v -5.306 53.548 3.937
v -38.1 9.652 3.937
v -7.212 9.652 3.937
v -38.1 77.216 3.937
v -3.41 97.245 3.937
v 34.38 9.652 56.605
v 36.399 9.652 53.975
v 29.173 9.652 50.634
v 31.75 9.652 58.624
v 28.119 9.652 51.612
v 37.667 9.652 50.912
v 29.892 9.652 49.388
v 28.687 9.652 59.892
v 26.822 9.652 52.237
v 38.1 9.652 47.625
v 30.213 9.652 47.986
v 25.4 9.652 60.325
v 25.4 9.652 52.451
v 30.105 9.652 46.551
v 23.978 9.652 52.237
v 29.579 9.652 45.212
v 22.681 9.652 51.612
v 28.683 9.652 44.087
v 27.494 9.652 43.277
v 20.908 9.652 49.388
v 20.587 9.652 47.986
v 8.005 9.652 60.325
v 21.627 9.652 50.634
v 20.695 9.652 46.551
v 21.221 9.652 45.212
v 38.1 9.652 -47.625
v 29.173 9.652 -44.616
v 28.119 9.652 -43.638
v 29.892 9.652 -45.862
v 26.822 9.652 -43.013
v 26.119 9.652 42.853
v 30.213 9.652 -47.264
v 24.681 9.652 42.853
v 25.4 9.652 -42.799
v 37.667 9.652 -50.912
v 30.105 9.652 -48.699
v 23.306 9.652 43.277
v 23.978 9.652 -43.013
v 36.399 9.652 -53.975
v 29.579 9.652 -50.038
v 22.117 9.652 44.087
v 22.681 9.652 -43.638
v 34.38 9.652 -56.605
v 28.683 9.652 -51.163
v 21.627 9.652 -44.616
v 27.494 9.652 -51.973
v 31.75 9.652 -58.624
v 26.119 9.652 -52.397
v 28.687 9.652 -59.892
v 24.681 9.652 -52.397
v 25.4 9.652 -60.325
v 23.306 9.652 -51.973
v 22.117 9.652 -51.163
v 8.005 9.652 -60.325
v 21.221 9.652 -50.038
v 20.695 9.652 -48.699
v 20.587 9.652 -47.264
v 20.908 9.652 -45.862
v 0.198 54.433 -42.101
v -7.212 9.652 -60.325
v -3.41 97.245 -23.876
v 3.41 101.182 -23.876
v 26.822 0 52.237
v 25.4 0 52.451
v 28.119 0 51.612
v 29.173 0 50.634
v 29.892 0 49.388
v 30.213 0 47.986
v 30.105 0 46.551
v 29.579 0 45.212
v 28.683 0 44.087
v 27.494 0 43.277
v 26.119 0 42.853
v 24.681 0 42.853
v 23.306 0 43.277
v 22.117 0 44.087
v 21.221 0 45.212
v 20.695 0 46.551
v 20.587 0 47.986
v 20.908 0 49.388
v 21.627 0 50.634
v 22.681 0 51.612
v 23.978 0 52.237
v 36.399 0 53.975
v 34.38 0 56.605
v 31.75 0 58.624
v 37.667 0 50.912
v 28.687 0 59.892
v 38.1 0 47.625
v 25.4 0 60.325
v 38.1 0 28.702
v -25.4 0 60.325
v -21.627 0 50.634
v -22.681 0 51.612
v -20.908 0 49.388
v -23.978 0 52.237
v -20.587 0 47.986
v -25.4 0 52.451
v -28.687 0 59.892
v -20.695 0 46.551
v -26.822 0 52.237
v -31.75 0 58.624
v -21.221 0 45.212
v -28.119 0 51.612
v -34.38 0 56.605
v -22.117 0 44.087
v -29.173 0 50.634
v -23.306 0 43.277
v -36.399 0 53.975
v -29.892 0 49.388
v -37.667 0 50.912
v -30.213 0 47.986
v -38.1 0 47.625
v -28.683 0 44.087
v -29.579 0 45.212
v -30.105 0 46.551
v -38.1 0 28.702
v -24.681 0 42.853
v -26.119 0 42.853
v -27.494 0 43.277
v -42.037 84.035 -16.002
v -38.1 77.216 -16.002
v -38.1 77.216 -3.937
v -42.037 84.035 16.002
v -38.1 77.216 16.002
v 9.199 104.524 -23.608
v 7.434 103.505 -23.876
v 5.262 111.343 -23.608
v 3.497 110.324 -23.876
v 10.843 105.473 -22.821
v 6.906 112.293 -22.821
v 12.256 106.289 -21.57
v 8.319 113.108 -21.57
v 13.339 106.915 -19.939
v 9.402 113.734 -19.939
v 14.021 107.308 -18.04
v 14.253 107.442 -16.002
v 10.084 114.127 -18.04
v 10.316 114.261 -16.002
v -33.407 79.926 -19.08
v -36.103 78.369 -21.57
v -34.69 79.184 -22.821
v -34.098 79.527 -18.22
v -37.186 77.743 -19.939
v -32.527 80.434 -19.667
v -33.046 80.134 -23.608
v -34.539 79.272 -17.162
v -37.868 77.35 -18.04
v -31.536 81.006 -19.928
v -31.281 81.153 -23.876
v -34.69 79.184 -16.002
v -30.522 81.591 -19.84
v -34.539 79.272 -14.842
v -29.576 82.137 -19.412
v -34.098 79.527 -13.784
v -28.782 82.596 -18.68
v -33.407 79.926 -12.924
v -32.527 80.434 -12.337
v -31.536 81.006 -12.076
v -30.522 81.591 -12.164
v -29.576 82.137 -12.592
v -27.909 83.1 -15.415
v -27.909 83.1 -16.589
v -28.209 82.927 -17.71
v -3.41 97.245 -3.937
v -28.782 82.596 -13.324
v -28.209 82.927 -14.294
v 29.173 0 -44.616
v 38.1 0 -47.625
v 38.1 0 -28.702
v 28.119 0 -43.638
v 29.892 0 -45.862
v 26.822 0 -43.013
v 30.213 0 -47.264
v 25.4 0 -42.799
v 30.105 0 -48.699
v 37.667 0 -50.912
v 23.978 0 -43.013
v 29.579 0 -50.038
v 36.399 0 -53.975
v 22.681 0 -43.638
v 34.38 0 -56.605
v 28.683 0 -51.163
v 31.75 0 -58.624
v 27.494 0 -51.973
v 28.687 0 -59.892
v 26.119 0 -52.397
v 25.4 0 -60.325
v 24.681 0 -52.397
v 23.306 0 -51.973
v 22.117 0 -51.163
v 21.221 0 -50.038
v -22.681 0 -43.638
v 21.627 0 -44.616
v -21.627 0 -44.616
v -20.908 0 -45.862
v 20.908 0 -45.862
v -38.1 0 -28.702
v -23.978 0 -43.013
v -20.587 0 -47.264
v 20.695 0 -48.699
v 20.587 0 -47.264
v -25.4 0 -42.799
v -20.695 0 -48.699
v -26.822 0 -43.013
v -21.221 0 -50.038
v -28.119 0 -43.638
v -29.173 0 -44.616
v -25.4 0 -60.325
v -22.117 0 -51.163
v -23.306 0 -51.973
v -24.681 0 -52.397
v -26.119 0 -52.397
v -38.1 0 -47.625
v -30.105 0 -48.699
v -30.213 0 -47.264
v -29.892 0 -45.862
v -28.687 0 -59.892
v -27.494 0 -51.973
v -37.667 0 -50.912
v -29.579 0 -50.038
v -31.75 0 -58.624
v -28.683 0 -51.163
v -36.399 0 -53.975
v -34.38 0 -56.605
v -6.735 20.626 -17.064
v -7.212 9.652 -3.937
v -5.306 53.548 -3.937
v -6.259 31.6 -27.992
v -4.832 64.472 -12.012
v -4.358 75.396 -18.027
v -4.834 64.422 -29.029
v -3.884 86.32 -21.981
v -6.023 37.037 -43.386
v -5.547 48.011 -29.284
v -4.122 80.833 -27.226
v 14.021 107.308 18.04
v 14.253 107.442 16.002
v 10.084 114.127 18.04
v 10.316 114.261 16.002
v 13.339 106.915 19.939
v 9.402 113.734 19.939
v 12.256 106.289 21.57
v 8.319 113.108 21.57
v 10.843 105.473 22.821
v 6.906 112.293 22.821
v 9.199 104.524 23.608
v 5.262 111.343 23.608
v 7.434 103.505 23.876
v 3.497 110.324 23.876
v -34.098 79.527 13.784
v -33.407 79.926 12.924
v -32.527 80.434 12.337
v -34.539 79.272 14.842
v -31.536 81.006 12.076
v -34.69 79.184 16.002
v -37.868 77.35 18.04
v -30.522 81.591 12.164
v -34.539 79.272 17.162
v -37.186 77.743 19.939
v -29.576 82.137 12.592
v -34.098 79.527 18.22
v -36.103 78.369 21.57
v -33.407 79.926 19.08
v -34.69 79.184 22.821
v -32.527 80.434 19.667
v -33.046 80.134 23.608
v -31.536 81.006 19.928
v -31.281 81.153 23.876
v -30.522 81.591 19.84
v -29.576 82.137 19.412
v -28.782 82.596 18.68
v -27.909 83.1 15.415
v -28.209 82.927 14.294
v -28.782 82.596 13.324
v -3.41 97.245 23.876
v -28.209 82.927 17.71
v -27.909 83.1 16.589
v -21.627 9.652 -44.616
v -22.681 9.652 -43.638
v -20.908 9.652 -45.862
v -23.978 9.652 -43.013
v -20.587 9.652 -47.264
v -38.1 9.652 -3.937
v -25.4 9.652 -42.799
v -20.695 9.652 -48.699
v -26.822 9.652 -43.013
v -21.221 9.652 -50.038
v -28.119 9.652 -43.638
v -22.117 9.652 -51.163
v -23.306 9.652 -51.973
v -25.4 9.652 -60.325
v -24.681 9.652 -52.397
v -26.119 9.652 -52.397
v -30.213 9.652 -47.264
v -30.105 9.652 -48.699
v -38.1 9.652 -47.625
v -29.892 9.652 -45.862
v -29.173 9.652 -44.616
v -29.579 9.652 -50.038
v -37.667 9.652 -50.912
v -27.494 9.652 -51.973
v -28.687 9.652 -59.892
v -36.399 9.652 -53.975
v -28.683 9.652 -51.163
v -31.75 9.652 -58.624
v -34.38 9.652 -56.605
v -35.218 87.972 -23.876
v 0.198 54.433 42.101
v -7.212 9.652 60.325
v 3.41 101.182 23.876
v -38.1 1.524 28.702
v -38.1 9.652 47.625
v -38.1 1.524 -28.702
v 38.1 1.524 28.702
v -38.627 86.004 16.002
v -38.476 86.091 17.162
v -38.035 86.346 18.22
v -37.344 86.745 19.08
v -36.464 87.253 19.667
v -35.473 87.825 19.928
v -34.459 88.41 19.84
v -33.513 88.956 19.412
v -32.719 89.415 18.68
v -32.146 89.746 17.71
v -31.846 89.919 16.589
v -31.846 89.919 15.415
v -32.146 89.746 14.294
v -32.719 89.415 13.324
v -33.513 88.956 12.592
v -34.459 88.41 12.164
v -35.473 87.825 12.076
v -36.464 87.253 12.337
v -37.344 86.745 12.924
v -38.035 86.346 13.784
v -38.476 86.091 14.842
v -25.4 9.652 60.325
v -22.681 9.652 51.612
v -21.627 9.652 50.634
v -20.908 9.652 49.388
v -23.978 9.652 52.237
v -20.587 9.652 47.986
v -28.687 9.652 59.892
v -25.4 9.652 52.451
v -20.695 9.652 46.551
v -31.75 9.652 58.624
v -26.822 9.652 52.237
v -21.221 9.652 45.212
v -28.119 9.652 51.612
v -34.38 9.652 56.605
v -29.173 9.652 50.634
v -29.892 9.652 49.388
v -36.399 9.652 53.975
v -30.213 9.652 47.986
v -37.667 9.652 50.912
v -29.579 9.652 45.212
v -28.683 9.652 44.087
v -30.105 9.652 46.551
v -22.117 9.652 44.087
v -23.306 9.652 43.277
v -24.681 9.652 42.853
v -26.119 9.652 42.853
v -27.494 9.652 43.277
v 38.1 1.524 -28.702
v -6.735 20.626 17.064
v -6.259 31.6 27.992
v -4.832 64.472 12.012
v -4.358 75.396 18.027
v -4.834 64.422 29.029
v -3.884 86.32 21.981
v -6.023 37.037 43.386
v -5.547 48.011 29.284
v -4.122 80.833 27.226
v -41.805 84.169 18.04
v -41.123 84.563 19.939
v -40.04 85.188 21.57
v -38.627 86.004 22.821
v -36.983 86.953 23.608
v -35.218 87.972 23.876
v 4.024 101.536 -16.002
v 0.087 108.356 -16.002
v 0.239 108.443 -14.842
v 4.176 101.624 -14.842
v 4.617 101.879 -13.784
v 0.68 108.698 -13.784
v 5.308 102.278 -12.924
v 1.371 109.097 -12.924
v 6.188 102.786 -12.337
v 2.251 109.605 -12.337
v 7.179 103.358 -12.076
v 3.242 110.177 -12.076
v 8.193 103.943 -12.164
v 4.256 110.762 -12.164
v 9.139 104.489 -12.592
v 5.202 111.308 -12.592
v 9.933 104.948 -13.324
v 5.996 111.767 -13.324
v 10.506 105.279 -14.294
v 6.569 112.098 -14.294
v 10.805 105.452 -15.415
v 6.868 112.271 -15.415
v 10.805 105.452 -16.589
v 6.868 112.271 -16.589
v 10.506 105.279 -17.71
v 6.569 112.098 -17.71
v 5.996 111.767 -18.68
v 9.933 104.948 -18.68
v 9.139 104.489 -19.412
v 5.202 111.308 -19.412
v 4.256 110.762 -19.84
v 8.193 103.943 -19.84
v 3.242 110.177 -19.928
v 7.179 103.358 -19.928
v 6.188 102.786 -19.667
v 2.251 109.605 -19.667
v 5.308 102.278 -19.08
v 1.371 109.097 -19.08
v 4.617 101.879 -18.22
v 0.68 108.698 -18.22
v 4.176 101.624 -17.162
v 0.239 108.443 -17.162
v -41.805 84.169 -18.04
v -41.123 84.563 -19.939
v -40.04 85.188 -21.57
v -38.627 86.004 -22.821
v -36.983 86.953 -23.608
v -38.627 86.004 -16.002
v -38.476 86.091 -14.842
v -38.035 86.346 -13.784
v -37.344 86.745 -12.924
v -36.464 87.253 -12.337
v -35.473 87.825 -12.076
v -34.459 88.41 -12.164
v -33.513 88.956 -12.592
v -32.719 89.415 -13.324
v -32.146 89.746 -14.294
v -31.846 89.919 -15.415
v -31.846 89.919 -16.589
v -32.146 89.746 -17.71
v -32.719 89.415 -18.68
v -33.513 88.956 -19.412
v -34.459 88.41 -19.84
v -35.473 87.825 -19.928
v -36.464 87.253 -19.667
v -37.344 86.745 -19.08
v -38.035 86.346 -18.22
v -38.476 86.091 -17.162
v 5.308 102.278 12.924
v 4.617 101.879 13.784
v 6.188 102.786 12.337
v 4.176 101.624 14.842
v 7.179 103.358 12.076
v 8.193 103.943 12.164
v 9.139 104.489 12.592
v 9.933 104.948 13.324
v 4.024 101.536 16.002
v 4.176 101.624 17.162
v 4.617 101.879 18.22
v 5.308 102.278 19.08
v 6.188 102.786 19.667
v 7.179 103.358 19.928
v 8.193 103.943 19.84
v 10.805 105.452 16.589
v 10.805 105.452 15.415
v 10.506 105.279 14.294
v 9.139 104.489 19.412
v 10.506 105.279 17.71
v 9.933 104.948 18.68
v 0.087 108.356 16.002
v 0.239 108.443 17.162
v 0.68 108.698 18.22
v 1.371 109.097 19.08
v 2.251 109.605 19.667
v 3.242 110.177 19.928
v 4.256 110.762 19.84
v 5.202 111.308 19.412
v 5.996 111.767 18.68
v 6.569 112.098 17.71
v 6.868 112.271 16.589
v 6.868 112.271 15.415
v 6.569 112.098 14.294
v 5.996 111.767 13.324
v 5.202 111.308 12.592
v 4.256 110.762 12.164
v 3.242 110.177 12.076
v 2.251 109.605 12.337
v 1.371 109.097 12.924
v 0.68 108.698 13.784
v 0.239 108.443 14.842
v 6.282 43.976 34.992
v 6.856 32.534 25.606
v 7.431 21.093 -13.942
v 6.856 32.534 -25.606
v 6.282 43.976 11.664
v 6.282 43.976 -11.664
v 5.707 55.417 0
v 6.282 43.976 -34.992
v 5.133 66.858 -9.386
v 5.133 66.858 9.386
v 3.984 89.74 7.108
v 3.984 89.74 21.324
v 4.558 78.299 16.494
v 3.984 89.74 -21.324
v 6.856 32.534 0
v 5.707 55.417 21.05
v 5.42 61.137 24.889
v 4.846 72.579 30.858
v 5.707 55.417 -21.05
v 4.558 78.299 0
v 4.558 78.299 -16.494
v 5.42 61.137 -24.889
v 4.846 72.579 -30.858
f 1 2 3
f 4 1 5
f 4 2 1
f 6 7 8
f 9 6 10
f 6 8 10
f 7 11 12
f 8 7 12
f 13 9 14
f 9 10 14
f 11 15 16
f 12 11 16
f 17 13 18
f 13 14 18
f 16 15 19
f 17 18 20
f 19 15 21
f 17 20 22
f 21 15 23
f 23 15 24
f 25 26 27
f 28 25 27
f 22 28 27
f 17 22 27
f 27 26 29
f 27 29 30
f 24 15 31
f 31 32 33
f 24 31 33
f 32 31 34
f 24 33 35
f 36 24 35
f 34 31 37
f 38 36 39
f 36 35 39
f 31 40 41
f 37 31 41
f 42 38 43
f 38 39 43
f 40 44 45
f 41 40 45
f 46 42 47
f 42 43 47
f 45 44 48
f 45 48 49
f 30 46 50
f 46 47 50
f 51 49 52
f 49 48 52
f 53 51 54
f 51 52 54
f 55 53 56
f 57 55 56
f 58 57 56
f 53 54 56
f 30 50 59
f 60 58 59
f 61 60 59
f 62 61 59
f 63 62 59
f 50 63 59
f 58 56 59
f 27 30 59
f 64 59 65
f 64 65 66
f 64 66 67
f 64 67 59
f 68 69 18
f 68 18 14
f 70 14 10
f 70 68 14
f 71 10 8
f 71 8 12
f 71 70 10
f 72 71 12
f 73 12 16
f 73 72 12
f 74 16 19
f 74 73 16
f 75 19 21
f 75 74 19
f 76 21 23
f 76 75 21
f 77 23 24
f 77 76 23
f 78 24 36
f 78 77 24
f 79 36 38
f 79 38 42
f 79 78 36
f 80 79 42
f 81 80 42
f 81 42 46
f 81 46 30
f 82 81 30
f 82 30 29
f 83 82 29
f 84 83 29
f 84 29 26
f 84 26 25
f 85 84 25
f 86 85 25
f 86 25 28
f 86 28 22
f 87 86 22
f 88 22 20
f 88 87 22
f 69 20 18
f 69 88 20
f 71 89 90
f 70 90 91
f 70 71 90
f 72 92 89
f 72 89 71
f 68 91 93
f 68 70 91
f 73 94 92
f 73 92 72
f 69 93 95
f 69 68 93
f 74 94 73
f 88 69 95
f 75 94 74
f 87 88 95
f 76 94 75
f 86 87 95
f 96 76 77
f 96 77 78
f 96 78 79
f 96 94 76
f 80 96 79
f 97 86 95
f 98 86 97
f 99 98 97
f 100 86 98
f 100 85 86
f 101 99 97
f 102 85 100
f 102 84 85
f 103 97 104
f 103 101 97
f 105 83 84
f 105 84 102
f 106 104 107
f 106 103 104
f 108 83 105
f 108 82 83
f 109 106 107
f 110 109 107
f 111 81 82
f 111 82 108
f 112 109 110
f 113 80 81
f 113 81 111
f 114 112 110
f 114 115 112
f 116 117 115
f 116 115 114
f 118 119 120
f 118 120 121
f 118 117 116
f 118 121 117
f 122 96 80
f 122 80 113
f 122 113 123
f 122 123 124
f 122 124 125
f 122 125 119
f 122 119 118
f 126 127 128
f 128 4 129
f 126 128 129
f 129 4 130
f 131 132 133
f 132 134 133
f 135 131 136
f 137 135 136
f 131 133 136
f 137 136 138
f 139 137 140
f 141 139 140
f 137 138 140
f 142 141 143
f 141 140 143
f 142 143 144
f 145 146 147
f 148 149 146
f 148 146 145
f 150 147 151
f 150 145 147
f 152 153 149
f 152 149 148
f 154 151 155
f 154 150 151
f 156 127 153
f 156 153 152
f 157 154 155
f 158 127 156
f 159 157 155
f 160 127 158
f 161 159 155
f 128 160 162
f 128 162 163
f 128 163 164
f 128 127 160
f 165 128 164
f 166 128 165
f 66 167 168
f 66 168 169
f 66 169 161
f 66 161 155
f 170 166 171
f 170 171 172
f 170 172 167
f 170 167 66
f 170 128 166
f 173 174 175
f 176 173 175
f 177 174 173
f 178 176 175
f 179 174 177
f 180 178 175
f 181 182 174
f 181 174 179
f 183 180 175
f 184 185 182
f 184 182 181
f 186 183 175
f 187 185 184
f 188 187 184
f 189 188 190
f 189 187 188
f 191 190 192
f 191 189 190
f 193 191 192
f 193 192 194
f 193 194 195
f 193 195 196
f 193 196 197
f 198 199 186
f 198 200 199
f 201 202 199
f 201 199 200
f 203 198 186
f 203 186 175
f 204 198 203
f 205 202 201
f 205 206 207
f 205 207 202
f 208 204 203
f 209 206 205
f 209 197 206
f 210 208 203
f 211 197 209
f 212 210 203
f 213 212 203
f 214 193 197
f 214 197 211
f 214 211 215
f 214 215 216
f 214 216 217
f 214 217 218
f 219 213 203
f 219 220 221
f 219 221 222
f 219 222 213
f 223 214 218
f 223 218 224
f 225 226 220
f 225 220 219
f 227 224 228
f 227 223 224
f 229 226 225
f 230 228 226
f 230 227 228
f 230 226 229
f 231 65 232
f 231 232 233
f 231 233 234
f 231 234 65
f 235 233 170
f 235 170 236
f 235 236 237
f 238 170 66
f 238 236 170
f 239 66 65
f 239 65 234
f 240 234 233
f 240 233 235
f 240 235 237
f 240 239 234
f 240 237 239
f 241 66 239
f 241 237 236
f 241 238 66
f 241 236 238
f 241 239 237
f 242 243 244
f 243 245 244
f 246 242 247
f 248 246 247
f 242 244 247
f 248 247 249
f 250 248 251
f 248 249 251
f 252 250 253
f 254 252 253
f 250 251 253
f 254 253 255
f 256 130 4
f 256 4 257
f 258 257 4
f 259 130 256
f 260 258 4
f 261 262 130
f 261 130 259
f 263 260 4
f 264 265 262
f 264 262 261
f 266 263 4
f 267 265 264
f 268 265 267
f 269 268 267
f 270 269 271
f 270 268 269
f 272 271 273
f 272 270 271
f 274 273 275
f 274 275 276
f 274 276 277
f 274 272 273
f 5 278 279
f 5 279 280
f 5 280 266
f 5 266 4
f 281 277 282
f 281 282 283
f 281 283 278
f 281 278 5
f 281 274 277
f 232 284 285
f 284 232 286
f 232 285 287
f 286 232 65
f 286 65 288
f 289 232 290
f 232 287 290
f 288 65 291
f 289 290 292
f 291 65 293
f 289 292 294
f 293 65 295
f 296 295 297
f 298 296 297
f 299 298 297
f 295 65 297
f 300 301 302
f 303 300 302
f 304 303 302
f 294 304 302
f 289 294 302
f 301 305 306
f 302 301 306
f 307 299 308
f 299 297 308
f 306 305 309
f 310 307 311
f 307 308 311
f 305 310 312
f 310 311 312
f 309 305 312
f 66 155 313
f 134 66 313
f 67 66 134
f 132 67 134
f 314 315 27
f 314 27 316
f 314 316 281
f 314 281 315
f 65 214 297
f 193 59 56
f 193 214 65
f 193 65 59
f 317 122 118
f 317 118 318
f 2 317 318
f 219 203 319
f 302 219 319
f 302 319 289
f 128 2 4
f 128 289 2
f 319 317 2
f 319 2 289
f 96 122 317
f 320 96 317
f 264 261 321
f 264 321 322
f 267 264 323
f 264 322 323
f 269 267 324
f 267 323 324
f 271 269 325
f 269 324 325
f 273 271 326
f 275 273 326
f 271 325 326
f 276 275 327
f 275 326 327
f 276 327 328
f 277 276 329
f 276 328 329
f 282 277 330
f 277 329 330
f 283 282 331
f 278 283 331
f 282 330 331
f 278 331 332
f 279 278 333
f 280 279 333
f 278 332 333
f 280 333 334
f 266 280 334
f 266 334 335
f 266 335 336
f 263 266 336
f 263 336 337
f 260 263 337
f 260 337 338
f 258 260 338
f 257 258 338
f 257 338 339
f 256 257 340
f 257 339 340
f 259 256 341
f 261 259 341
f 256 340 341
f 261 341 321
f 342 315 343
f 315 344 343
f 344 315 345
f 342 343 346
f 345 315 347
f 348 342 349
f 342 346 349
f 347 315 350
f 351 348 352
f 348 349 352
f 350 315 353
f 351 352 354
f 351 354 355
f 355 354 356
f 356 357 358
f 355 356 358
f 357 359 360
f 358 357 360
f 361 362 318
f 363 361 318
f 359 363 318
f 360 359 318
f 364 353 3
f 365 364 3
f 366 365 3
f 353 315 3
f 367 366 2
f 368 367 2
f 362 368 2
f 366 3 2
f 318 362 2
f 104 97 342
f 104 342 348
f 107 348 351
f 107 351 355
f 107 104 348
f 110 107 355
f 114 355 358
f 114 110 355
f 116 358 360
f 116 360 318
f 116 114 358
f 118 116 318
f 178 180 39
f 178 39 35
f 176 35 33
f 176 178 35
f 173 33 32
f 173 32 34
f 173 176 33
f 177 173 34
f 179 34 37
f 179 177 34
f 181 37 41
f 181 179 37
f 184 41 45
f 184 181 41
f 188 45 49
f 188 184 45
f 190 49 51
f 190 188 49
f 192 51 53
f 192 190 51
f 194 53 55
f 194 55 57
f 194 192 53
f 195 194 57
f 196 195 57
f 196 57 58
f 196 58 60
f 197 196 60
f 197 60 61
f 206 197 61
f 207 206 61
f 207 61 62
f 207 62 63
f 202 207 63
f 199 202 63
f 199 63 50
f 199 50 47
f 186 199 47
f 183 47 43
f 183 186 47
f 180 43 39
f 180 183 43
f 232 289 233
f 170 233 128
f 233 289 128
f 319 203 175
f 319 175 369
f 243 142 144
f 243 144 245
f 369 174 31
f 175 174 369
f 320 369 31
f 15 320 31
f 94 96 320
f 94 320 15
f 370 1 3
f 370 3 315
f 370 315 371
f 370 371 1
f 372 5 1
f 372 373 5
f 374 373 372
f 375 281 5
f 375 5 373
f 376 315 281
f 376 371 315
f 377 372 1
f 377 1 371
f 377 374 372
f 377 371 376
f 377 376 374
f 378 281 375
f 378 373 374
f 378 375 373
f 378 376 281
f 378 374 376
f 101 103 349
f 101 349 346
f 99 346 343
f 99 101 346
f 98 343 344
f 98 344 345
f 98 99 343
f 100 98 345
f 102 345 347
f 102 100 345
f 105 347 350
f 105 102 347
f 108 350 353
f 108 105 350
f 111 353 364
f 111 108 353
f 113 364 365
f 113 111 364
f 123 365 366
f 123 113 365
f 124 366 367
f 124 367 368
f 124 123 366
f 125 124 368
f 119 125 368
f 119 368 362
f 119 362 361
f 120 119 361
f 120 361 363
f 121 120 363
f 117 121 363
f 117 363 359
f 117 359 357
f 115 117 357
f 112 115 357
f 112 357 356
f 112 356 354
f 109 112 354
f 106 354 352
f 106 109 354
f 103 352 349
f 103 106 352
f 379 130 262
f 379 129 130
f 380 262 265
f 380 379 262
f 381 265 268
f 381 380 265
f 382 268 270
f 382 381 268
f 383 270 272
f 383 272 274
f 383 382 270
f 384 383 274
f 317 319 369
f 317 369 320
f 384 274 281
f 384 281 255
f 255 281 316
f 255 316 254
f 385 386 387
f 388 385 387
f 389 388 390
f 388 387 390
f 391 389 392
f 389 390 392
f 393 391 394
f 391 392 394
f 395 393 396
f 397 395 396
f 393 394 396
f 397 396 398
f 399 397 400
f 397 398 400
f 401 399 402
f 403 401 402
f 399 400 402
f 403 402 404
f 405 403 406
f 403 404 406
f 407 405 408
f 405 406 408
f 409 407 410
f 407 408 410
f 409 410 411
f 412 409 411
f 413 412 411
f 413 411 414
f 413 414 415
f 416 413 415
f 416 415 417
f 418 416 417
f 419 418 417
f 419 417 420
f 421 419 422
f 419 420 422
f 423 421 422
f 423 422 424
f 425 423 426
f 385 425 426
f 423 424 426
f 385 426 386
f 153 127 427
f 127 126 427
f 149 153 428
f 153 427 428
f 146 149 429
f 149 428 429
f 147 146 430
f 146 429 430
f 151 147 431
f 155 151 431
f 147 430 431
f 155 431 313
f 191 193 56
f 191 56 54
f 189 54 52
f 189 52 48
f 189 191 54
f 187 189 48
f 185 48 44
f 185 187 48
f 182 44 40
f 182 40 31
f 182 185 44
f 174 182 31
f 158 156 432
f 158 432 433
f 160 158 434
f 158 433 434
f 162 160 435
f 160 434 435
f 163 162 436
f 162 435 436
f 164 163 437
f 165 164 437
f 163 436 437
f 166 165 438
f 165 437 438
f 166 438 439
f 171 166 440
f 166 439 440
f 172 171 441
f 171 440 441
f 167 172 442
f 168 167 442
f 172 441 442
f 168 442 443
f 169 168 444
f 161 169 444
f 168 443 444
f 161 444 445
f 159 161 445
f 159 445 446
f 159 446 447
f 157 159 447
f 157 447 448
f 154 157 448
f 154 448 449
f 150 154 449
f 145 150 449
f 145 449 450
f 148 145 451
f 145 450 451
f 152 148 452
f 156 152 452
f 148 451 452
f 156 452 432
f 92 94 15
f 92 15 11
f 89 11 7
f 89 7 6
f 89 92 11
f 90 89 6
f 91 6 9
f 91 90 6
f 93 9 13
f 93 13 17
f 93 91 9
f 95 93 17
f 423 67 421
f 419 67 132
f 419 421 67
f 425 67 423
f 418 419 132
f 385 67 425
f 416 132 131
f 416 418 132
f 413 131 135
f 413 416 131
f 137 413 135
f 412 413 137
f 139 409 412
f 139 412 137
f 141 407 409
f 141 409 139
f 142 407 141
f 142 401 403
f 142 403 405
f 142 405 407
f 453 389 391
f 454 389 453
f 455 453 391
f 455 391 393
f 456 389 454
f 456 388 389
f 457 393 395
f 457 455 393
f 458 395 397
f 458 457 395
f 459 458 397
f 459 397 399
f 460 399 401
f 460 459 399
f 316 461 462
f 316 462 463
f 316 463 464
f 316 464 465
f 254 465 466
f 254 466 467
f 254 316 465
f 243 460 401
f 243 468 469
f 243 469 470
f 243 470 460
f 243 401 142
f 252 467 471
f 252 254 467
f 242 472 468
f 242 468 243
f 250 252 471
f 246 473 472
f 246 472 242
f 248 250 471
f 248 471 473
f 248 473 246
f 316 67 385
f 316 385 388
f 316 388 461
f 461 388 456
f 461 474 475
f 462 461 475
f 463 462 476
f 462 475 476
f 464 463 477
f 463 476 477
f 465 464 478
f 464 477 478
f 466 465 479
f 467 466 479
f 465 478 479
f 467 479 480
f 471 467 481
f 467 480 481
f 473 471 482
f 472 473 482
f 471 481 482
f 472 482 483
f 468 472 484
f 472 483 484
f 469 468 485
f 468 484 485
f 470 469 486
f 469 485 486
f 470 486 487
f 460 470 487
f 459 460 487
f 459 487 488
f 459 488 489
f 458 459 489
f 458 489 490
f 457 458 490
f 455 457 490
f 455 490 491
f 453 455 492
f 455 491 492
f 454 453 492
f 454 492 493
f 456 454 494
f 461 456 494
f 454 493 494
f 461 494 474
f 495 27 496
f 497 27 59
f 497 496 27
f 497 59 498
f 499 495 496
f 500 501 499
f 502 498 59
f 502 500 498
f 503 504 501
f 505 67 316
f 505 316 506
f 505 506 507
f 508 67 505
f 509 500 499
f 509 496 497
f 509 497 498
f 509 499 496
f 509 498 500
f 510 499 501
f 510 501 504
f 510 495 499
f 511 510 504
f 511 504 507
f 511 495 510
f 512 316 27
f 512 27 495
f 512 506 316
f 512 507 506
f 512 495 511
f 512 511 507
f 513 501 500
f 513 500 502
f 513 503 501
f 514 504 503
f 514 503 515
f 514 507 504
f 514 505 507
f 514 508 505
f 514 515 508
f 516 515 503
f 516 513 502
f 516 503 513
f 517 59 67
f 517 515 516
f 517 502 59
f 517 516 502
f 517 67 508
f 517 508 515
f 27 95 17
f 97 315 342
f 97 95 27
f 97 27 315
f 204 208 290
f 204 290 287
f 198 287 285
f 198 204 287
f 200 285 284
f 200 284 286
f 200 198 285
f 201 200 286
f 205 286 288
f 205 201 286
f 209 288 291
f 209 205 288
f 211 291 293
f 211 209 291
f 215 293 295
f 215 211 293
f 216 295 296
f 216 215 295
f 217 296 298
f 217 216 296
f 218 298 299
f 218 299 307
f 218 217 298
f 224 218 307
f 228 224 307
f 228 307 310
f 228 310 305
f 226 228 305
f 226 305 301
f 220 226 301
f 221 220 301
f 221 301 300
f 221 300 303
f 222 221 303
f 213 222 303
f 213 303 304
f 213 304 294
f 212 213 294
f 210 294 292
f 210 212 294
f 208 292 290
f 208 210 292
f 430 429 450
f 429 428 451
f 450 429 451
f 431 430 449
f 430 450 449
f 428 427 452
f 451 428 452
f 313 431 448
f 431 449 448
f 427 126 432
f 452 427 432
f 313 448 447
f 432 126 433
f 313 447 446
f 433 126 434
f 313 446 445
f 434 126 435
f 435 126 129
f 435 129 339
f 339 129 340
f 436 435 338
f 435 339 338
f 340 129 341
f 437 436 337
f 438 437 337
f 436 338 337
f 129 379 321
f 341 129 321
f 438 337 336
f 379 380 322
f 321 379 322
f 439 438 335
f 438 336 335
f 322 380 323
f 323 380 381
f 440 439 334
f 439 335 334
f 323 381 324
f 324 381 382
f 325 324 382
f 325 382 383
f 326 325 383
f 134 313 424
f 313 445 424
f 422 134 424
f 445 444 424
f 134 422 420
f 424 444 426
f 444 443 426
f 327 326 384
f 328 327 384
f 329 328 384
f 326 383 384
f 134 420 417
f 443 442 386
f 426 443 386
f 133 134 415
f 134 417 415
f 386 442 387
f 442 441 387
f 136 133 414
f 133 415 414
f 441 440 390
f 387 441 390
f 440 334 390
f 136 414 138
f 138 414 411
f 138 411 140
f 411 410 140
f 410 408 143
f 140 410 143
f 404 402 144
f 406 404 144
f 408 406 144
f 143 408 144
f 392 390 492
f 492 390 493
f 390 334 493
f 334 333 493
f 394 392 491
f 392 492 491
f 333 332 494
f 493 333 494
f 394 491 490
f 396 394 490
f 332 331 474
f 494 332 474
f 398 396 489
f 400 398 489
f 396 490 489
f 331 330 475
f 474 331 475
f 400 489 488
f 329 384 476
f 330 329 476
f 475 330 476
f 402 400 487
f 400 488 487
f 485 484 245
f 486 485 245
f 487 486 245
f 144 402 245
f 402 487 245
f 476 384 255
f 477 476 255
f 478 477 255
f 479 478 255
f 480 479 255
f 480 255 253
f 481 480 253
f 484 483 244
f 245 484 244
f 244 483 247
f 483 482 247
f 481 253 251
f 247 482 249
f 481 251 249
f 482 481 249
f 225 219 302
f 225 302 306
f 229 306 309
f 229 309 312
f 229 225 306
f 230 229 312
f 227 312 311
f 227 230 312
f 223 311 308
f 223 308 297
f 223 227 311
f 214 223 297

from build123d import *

# Parameters (mm, degrees)
SKETCH1_R           = 4.826
BOSS_EXTRUDE1_DEPTH = 9.652
SKETCH2_W           = 57.404
SKETCH2_H           = 3.048
CUT_EXTRUDE1_DEPTH  = 98.666302935
SKETCH5_W           = 60.452
SKETCH5_H           = 47.752
BOSS_EXTRUDE2_DEPTH = 7.874
FILLET1_R           = 7.874
SKETCH7_R           = 3.937
CUT_EXTRUDE2_DEPTH  = 7.874
RIB1_REACH          = 137.874
SKETCH11_WALL_W     = 341.312489082
SKETCH11_WALL_H     = 7.874


with BuildPart() as part:
    # Sketch1 → Boss-Extrude1 (new body)
    with BuildSketch(Plane(origin=(0, 0, 0), x_dir=(1, 0, 0), z_dir=(0, 1, 0))):
        with BuildLine():
            Line((-25.4, 60.325), (25.4, 60.325))
            ThreePointArc((25.4, 60.325), (34.380256121, 56.605256121), (38.1, 47.625))
            Line((38.1, 47.625), (38.1, -47.625))
            ThreePointArc((38.1, -47.625), (34.380256121, -56.605256121), (25.4, -60.325))
            Line((25.4, -60.325), (-25.4, -60.325))
            ThreePointArc((-25.4, -60.325), (-34.380256121, -56.605256121), (-38.1, -47.625))
            Line((-38.1, -47.625), (-38.1, 47.625))
            ThreePointArc((-38.1, 47.625), (-34.380256121, 56.605256121), (-25.4, 60.325))
        make_face()
        with Locations(Location((-25.4, -47.625, 0), (0, 0, 270))):
            Circle(SKETCH1_R, mode=Mode.SUBTRACT)
        with Locations(Location((25.4, -47.625, 0), (0, 0, 270))):
            Circle(SKETCH1_R, mode=Mode.SUBTRACT)
        with Locations(Location((25.4, 47.625, 0), (0, 0, 270))):
            Circle(SKETCH1_R, mode=Mode.SUBTRACT)
        with Locations(Location((-25.4, 47.625, 0), (0, 0, 270))):
            Circle(SKETCH1_R, mode=Mode.SUBTRACT)
    extrude(amount=BOSS_EXTRUDE1_DEPTH)

    # Sketch2 → Cut-Extrude1 (cut, through all)
    with BuildSketch(Plane.ZY.offset(38.1)):
        Rectangle(SKETCH2_W, SKETCH2_H)
    extrude(amount=-CUT_EXTRUDE1_DEPTH, mode=Mode.SUBTRACT)



with BuildPart() as body_2:
    # Sketch5 → Boss-Extrude2 (new body)
    with BuildSketch(Plane(origin=(-42.960508789, 74.409783942, 0), x_dir=(0.8660254037844399, 0.49999999999999795, 0), z_dir=(0.4999999999999979, -0.8660254037844398, 0))):
        with Locations((35.838432116, 0)):
            Rectangle(SKETCH5_W, SKETCH5_H)
    extrude(amount=-BOSS_EXTRUDE2_DEPTH)

    # Fillet1
    fillet1_edges = [body_2.edges().sort_by_distance(p)[0] for p in [
        (-40.0685, 80.625542015, 23.876),
        (12.28446771, 110.851542015, 23.876),
        (12.28446771, 110.851542015, -23.876),
        (-40.0685, 80.625542015, -23.876),
    ]]
    fillet(fillet1_edges, radius=FILLET1_R)

    # Sketch7 → Cut-Extrude2 (cut)
    with BuildSketch(Plane(origin=(-46.897508789, 81.228867971, 0), x_dir=(0.8660254037844398, 0.49999999999999806, 0), z_dir=(-0.499999999999998, 0.8660254037844397, 0))):
        with Locations(Location((13.486432116, 16.002, 0), (0, 0, 180))):
            Circle(SKETCH7_R)
        with Locations(Location((13.486432116, -16.002, 0), (0, 0, 180))):
            Circle(SKETCH7_R)
        with Locations(Location((58.190432116, -16.002, 0), (0, 0, 180))):
            Circle(SKETCH7_R)
        with Locations(Location((58.190432116, 16.002, 0), (0, 0, 180))):
            Circle(SKETCH7_R)
    extrude(amount=-CUT_EXTRUDE2_DEPTH, mode=Mode.SUBTRACT)


with BuildPart() as part_1:
    add(part.part)

    add(body_2.part)  # Loft1 merges body 2
    # Sketch3 → Loft1 section 0
    with BuildSketch(Plane(origin=(0, 9.652, 0), x_dir=(1, 0, 0), z_dir=(0, 1, 0))):
        with BuildLine():
            Line((8.005076562, 60.325), (-7.211701075, 60.325))
            Line((-7.211701075, 60.325), (-7.211701075, -60.325))
            Line((-7.211701075, -60.325), (8.005076562, -60.325))
            Line((8.005076562, -60.325), (8.005076562, 60.325))
        make_face()
    # Sketch10 → Loft1 section 1
    with BuildSketch(Plane(origin=(-42.960508789, 74.409783942, 0), x_dir=(0.8660254037844398, 0.49999999999999806, 0), z_dir=(0.499999999999998, -0.8660254037844397, 0))):
        with BuildLine():
            Line((53.543522628, 23.876), (45.669522628, 23.876))
            Line((45.669522628, 23.876), (45.669522628, -23.876))
            Line((45.669522628, -23.876), (53.543522628, -23.876))
            Line((53.543522628, -23.876), (53.543522628, 23.876))
        make_face()
    loft()

    # Sketch11 wall → Rib1 (add, up to next)
    with BuildSketch(Plane(origin=(-38.1, 43.434, 0), x_dir=(0, 1, 0), z_dir=(-1, 0, 0)), mode=Mode.PRIVATE) as rib1_sk1:
        Rectangle(SKETCH11_WALL_W, SKETCH11_WALL_H)
    rib1_tool1 = extrude(rib1_sk1.sketch, amount=-RIB1_REACH, mode=Mode.PRIVATE) - part_1.part
    add(rib1_tool1.solids().sort_by_distance((-38.1, 43.434, 0))[0])


solid = part_1.part
